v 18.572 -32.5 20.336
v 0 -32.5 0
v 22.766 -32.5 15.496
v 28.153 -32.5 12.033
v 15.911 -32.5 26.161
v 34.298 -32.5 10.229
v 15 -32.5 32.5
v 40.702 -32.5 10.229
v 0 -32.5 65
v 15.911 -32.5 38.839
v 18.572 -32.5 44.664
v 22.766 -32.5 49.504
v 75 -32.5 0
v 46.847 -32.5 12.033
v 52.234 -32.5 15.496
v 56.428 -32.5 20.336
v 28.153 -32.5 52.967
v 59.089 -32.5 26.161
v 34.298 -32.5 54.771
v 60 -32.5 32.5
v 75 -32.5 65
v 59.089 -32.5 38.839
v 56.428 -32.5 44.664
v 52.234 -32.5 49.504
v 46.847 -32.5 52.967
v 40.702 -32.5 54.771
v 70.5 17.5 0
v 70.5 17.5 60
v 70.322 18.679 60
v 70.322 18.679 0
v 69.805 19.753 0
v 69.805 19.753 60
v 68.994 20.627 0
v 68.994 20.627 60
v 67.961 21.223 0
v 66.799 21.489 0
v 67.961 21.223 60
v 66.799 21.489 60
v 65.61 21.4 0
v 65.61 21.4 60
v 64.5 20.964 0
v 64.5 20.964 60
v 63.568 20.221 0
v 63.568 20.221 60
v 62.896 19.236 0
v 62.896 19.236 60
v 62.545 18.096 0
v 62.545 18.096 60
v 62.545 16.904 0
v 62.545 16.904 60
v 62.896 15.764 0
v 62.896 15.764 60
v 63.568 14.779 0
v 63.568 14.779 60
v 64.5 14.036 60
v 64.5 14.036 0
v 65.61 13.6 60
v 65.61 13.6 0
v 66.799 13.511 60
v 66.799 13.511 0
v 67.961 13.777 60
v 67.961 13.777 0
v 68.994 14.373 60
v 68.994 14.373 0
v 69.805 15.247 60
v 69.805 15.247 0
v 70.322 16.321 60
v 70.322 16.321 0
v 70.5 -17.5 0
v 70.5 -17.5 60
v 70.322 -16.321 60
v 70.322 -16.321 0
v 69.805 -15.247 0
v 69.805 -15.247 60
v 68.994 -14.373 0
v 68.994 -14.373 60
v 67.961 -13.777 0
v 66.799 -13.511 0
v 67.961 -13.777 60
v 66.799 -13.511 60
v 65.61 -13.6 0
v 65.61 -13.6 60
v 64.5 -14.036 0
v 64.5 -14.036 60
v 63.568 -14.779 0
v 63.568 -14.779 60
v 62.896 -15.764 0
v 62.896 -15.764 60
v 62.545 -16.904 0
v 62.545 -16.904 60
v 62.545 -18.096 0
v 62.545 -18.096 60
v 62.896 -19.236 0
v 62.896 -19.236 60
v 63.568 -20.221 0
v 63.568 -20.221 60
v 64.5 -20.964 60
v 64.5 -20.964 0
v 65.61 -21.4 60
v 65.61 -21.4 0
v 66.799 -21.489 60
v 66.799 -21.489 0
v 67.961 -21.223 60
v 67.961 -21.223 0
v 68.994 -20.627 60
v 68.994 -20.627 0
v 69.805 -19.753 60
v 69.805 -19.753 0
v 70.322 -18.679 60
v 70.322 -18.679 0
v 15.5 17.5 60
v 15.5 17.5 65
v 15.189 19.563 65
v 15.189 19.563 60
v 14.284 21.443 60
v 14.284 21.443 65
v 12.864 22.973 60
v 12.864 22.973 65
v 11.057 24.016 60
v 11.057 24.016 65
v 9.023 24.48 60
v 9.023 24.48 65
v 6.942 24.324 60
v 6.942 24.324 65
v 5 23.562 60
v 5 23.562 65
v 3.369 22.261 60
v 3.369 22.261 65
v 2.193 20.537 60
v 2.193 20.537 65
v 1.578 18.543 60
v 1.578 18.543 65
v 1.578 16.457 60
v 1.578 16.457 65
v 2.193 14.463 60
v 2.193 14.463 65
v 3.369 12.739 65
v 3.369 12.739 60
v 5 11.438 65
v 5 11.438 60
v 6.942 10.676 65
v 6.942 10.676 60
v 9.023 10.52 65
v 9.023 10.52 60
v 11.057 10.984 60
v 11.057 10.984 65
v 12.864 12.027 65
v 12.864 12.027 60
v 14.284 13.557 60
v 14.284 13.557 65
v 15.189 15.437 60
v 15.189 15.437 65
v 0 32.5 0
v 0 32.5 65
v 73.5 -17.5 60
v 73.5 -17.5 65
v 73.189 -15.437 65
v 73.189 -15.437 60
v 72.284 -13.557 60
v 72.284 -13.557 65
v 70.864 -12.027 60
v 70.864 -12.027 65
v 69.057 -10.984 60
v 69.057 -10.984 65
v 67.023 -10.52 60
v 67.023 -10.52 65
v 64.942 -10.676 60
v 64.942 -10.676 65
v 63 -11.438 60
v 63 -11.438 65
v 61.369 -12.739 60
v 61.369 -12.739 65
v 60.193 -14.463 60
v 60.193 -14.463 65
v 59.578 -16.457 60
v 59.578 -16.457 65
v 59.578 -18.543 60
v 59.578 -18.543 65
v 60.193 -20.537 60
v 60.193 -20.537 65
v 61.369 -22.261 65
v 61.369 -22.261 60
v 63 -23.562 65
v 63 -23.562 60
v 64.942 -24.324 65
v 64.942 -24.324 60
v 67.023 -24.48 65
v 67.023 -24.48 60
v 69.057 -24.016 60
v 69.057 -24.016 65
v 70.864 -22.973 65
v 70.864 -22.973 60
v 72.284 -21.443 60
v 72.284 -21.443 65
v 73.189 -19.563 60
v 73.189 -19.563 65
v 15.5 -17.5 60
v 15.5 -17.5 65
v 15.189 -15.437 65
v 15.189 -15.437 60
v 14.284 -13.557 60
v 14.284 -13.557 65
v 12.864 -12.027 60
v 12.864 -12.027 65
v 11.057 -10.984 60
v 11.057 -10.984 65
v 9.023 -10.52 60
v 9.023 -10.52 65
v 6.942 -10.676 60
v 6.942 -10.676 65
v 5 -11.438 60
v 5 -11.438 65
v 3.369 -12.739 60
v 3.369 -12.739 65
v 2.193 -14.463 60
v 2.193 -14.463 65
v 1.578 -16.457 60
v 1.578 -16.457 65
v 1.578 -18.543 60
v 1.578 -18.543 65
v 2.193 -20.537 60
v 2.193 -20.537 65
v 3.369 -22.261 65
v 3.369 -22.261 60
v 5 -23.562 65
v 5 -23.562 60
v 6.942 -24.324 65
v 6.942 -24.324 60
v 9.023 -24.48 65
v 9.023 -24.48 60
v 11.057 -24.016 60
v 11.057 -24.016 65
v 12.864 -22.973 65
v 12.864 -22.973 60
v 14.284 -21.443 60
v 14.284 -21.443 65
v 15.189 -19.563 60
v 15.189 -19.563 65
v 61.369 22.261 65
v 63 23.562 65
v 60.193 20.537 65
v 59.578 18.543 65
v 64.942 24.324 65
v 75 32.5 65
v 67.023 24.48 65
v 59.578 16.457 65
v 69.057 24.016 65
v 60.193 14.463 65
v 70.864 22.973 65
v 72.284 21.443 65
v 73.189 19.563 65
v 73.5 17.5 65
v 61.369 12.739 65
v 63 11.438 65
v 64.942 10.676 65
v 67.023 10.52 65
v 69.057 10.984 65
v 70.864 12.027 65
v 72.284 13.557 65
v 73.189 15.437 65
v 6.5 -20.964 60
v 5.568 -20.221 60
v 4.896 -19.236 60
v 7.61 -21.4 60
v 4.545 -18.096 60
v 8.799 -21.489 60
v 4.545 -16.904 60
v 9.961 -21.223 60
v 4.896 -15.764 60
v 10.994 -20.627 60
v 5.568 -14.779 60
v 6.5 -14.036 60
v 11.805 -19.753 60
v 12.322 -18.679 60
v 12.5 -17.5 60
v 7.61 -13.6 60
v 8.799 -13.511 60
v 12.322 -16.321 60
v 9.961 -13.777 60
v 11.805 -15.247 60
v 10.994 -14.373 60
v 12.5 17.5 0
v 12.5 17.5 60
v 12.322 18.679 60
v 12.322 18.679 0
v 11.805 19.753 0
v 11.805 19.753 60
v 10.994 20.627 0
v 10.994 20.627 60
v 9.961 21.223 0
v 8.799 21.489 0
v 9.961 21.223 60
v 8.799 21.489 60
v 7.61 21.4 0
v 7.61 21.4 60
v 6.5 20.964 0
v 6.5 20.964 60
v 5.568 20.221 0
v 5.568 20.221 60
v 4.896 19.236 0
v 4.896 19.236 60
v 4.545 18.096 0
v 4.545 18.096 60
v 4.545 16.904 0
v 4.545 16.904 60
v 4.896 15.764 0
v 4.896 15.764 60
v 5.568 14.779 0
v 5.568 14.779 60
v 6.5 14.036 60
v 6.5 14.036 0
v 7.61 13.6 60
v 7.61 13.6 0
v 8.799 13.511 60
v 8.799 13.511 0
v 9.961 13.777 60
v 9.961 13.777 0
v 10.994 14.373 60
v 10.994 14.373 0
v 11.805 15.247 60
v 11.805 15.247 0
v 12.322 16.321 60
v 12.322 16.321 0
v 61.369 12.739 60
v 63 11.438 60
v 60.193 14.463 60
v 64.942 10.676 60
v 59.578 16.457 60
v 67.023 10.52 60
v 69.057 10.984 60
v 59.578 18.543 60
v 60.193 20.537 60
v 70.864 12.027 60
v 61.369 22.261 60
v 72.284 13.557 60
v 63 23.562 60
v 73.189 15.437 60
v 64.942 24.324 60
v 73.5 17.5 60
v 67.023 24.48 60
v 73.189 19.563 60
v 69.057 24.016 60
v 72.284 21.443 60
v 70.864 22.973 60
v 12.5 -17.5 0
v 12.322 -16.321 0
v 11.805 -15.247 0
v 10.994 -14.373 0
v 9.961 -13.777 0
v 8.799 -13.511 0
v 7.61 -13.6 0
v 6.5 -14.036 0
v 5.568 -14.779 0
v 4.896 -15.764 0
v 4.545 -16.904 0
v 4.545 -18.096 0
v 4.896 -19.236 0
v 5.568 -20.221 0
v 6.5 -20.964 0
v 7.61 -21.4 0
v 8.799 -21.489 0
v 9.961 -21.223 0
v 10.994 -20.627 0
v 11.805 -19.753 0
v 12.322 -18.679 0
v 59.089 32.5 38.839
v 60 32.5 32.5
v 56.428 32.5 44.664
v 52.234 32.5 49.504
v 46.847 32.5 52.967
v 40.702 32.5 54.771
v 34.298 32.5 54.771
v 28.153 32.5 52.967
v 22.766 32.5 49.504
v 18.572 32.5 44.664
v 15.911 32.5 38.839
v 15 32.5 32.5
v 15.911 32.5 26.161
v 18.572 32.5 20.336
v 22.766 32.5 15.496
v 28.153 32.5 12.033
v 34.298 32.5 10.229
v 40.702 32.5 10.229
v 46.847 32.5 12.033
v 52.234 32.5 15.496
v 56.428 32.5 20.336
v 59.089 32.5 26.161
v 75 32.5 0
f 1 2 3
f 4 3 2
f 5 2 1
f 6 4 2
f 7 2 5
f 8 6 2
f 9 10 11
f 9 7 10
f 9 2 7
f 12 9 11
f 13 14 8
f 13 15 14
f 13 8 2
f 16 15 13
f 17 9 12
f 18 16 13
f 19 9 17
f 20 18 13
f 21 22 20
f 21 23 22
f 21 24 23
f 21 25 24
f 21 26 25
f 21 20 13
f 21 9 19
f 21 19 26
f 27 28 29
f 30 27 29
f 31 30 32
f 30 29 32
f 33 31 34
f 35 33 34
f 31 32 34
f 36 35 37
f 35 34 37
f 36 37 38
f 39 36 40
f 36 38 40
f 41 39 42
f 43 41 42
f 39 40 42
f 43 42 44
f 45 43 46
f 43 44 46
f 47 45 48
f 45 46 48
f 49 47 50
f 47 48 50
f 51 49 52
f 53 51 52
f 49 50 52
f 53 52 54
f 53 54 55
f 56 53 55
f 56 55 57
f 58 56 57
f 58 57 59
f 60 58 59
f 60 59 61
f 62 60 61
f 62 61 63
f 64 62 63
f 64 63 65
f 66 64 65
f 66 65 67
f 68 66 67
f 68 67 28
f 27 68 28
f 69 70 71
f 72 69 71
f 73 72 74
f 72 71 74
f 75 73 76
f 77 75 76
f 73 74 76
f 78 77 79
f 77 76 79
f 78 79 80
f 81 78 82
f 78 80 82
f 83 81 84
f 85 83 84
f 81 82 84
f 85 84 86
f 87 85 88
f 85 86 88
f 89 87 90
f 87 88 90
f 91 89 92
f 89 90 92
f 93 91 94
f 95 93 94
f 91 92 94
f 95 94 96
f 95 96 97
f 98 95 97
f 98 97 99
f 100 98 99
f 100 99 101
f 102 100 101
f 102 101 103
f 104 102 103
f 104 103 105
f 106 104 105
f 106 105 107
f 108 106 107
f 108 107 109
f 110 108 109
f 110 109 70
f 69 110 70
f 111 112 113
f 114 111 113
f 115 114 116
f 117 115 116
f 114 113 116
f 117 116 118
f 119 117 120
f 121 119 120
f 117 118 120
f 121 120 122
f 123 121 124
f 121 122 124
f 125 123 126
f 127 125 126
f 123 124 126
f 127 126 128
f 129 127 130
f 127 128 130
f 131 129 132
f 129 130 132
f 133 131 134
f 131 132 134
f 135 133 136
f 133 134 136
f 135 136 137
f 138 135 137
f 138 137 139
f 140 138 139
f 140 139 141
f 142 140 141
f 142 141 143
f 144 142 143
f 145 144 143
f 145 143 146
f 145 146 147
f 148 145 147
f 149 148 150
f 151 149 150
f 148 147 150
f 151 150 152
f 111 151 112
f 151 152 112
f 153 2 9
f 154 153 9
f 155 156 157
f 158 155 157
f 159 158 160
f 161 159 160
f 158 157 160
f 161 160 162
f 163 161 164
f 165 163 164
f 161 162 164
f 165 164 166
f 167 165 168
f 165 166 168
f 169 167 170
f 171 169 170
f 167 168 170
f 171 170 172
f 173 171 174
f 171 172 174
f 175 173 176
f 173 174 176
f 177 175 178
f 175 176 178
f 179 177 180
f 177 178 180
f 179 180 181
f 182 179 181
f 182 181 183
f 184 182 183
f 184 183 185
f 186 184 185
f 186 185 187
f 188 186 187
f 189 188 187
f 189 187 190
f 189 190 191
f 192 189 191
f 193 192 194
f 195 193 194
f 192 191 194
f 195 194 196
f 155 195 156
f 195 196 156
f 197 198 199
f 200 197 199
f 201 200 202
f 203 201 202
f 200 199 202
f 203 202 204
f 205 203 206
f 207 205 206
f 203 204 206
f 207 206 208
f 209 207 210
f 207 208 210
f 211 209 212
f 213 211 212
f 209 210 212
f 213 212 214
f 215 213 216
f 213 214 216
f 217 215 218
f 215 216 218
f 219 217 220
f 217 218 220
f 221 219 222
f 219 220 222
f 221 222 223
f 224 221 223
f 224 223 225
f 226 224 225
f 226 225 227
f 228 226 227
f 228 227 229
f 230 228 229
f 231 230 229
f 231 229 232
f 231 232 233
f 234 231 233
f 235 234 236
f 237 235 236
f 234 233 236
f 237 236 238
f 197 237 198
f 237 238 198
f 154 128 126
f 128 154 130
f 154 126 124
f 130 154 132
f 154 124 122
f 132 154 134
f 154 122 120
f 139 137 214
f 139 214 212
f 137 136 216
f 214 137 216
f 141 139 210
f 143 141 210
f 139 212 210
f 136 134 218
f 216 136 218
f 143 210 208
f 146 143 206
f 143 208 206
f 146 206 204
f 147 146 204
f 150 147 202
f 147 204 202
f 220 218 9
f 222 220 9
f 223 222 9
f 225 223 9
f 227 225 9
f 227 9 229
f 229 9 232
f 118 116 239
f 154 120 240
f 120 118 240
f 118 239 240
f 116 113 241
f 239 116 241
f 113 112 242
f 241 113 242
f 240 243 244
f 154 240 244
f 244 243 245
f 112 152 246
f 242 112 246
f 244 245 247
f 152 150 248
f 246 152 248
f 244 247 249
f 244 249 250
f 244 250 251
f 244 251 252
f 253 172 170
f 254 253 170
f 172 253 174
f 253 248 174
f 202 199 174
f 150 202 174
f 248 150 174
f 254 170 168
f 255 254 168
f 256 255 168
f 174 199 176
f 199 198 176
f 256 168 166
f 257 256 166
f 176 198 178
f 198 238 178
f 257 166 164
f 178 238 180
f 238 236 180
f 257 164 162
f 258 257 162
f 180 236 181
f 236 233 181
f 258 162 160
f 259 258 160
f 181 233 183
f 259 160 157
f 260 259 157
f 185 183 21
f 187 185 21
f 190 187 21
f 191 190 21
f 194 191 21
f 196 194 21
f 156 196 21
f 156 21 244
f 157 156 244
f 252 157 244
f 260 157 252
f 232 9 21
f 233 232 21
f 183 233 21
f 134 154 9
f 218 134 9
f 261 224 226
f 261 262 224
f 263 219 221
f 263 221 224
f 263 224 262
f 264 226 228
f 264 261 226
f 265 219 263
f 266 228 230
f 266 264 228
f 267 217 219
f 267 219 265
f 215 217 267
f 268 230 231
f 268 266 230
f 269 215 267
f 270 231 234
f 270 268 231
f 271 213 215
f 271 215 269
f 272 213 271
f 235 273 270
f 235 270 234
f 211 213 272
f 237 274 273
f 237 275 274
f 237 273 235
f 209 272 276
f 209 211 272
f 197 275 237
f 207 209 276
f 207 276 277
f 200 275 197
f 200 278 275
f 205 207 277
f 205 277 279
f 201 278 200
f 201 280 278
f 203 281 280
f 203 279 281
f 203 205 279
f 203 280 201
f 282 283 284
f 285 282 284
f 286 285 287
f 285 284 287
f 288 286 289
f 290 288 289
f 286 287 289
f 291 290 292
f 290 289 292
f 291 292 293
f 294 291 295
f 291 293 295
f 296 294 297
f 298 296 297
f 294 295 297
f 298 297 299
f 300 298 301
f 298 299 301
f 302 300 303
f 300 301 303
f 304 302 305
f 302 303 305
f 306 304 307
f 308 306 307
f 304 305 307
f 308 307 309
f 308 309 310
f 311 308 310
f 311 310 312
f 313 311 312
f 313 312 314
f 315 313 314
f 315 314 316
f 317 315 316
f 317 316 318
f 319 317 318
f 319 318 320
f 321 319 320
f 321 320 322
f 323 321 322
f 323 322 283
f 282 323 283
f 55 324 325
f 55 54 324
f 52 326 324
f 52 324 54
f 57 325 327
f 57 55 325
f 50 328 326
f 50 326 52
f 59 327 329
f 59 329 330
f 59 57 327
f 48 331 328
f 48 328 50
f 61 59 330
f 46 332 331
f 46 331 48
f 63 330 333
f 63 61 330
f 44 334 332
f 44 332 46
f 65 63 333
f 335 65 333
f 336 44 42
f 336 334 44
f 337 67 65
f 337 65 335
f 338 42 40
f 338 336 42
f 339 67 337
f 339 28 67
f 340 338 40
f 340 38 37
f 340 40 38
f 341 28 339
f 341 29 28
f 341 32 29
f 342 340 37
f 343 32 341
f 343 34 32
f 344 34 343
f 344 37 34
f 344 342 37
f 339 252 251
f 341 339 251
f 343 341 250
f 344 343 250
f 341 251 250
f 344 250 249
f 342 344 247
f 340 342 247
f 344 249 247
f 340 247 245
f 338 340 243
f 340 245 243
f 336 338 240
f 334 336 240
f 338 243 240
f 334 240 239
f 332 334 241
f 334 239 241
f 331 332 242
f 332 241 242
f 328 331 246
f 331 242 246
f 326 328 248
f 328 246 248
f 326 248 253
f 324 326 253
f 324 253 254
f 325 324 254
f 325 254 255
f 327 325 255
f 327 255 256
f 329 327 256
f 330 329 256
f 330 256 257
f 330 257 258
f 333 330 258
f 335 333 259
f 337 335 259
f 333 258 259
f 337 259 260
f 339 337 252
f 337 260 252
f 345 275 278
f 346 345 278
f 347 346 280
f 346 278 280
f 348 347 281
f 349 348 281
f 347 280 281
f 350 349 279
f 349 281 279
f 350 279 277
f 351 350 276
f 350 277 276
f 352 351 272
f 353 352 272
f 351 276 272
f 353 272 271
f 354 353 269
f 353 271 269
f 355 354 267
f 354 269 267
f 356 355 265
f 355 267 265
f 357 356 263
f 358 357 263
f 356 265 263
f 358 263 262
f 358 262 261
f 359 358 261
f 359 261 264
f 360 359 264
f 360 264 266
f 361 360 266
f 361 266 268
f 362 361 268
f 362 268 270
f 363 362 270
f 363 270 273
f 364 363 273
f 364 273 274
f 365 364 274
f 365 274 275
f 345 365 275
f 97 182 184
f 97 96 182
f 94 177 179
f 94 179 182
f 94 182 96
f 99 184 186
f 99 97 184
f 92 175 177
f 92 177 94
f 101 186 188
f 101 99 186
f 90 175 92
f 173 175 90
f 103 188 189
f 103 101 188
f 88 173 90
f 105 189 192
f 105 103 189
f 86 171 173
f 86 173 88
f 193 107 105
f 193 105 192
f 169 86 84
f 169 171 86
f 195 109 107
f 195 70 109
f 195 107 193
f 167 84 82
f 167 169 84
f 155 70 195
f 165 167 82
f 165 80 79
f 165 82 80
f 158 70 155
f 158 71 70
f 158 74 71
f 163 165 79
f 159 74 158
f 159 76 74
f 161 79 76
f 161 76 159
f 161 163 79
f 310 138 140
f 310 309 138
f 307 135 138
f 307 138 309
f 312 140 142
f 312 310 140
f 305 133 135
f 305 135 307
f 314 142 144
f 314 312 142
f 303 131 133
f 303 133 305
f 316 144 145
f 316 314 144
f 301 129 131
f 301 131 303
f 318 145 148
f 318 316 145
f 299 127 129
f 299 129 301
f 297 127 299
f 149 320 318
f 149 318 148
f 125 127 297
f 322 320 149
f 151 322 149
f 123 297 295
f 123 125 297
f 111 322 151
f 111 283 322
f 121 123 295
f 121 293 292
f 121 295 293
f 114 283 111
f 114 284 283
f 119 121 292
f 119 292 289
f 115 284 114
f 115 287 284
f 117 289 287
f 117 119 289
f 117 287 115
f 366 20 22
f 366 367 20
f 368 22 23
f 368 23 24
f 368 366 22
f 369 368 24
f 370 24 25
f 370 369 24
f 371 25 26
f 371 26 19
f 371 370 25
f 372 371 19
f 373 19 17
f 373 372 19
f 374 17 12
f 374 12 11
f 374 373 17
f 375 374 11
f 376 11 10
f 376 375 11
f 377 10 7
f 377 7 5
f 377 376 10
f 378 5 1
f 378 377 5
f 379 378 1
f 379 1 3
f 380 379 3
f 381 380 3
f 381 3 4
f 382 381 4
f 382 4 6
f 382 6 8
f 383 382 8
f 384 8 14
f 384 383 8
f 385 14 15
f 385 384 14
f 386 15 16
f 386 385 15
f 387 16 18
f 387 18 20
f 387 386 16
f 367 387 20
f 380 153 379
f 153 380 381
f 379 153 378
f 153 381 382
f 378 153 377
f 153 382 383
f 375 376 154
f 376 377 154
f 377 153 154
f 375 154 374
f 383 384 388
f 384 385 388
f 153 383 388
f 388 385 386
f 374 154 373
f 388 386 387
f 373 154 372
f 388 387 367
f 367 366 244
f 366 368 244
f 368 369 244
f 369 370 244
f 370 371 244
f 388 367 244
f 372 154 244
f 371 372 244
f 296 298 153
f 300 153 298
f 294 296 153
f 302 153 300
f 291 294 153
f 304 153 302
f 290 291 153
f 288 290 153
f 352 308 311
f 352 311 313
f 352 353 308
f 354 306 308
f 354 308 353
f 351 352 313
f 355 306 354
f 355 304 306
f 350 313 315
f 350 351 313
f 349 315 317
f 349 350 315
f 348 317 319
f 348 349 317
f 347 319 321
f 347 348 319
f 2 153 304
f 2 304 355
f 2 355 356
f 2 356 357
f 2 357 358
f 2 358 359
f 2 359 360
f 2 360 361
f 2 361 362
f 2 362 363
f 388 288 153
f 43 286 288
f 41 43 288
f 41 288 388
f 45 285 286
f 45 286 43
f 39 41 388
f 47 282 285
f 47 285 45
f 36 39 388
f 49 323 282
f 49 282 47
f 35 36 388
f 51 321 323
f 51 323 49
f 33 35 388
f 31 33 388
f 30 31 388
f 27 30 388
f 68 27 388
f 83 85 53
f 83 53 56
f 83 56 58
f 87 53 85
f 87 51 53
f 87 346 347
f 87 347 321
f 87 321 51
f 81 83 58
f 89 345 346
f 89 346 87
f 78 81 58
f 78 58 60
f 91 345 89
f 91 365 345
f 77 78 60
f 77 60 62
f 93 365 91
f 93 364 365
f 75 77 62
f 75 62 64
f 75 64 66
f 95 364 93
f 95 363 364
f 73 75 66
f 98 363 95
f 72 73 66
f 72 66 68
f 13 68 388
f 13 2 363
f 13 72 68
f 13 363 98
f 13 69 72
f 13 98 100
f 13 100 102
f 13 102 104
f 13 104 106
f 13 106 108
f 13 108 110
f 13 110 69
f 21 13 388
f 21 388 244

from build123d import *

# Parameters (mm, degrees)
F0_W     = 75
F0_H     = 65
F0_R     = 22.5
F1_DEPTH = 32.5
F2_R     = 4
F3_DEPTH = 65.001
F2_R_2   = 7
F4_DEPTH = 5


with BuildPart() as f1:
    # F0 (on Front) → F1 (new body, symmetric)
    with BuildSketch(Plane.XZ):
        with Locations((37.5, 32.5)):
            Rectangle(F0_W, F0_H)
        with Locations((37.5, 32.5)):
            Circle(F0_R, mode=Mode.SUBTRACT)
    extrude(amount=F1_DEPTH, both=True)

    # F2 (on face) → F3 (cut, through all)
    with BuildSketch(Plane.XY.offset(65)):
        with Locations((66.5, 17.5)):
            Circle(F2_R)
        with Locations((66.5, -17.5)):
            Circle(F2_R)
        with Locations((8.5, -17.5)):
            Circle(F2_R)
        with Locations((8.5, 17.5)):
            Circle(F2_R)
    extrude(amount=-F3_DEPTH, mode=Mode.SUBTRACT)

    # F2 (on face) → F4 (cut)
    with BuildSketch(Plane.XY.offset(65)):
        with Locations((8.5, 17.5)):
            Circle(F2_R_2)
        with Locations((8.5, 17.5)):
            Circle(F2_R, mode=Mode.SUBTRACT)
        with Locations((66.5, 17.5)):
            Circle(F2_R_2)
        with Locations((66.5, 17.5)):
            Circle(F2_R, mode=Mode.SUBTRACT)
        with Locations((66.5, -17.5)):
            Circle(F2_R_2)
        with Locations((66.5, -17.5)):
            Circle(F2_R, mode=Mode.SUBTRACT)
        with Locations((8.5, -17.5)):
            Circle(F2_R_2)
        with Locations((8.5, -17.5)):
            Circle(F2_R, mode=Mode.SUBTRACT)
    extrude(amount=-F4_DEPTH, mode=Mode.SUBTRACT)


solid = f1.part
